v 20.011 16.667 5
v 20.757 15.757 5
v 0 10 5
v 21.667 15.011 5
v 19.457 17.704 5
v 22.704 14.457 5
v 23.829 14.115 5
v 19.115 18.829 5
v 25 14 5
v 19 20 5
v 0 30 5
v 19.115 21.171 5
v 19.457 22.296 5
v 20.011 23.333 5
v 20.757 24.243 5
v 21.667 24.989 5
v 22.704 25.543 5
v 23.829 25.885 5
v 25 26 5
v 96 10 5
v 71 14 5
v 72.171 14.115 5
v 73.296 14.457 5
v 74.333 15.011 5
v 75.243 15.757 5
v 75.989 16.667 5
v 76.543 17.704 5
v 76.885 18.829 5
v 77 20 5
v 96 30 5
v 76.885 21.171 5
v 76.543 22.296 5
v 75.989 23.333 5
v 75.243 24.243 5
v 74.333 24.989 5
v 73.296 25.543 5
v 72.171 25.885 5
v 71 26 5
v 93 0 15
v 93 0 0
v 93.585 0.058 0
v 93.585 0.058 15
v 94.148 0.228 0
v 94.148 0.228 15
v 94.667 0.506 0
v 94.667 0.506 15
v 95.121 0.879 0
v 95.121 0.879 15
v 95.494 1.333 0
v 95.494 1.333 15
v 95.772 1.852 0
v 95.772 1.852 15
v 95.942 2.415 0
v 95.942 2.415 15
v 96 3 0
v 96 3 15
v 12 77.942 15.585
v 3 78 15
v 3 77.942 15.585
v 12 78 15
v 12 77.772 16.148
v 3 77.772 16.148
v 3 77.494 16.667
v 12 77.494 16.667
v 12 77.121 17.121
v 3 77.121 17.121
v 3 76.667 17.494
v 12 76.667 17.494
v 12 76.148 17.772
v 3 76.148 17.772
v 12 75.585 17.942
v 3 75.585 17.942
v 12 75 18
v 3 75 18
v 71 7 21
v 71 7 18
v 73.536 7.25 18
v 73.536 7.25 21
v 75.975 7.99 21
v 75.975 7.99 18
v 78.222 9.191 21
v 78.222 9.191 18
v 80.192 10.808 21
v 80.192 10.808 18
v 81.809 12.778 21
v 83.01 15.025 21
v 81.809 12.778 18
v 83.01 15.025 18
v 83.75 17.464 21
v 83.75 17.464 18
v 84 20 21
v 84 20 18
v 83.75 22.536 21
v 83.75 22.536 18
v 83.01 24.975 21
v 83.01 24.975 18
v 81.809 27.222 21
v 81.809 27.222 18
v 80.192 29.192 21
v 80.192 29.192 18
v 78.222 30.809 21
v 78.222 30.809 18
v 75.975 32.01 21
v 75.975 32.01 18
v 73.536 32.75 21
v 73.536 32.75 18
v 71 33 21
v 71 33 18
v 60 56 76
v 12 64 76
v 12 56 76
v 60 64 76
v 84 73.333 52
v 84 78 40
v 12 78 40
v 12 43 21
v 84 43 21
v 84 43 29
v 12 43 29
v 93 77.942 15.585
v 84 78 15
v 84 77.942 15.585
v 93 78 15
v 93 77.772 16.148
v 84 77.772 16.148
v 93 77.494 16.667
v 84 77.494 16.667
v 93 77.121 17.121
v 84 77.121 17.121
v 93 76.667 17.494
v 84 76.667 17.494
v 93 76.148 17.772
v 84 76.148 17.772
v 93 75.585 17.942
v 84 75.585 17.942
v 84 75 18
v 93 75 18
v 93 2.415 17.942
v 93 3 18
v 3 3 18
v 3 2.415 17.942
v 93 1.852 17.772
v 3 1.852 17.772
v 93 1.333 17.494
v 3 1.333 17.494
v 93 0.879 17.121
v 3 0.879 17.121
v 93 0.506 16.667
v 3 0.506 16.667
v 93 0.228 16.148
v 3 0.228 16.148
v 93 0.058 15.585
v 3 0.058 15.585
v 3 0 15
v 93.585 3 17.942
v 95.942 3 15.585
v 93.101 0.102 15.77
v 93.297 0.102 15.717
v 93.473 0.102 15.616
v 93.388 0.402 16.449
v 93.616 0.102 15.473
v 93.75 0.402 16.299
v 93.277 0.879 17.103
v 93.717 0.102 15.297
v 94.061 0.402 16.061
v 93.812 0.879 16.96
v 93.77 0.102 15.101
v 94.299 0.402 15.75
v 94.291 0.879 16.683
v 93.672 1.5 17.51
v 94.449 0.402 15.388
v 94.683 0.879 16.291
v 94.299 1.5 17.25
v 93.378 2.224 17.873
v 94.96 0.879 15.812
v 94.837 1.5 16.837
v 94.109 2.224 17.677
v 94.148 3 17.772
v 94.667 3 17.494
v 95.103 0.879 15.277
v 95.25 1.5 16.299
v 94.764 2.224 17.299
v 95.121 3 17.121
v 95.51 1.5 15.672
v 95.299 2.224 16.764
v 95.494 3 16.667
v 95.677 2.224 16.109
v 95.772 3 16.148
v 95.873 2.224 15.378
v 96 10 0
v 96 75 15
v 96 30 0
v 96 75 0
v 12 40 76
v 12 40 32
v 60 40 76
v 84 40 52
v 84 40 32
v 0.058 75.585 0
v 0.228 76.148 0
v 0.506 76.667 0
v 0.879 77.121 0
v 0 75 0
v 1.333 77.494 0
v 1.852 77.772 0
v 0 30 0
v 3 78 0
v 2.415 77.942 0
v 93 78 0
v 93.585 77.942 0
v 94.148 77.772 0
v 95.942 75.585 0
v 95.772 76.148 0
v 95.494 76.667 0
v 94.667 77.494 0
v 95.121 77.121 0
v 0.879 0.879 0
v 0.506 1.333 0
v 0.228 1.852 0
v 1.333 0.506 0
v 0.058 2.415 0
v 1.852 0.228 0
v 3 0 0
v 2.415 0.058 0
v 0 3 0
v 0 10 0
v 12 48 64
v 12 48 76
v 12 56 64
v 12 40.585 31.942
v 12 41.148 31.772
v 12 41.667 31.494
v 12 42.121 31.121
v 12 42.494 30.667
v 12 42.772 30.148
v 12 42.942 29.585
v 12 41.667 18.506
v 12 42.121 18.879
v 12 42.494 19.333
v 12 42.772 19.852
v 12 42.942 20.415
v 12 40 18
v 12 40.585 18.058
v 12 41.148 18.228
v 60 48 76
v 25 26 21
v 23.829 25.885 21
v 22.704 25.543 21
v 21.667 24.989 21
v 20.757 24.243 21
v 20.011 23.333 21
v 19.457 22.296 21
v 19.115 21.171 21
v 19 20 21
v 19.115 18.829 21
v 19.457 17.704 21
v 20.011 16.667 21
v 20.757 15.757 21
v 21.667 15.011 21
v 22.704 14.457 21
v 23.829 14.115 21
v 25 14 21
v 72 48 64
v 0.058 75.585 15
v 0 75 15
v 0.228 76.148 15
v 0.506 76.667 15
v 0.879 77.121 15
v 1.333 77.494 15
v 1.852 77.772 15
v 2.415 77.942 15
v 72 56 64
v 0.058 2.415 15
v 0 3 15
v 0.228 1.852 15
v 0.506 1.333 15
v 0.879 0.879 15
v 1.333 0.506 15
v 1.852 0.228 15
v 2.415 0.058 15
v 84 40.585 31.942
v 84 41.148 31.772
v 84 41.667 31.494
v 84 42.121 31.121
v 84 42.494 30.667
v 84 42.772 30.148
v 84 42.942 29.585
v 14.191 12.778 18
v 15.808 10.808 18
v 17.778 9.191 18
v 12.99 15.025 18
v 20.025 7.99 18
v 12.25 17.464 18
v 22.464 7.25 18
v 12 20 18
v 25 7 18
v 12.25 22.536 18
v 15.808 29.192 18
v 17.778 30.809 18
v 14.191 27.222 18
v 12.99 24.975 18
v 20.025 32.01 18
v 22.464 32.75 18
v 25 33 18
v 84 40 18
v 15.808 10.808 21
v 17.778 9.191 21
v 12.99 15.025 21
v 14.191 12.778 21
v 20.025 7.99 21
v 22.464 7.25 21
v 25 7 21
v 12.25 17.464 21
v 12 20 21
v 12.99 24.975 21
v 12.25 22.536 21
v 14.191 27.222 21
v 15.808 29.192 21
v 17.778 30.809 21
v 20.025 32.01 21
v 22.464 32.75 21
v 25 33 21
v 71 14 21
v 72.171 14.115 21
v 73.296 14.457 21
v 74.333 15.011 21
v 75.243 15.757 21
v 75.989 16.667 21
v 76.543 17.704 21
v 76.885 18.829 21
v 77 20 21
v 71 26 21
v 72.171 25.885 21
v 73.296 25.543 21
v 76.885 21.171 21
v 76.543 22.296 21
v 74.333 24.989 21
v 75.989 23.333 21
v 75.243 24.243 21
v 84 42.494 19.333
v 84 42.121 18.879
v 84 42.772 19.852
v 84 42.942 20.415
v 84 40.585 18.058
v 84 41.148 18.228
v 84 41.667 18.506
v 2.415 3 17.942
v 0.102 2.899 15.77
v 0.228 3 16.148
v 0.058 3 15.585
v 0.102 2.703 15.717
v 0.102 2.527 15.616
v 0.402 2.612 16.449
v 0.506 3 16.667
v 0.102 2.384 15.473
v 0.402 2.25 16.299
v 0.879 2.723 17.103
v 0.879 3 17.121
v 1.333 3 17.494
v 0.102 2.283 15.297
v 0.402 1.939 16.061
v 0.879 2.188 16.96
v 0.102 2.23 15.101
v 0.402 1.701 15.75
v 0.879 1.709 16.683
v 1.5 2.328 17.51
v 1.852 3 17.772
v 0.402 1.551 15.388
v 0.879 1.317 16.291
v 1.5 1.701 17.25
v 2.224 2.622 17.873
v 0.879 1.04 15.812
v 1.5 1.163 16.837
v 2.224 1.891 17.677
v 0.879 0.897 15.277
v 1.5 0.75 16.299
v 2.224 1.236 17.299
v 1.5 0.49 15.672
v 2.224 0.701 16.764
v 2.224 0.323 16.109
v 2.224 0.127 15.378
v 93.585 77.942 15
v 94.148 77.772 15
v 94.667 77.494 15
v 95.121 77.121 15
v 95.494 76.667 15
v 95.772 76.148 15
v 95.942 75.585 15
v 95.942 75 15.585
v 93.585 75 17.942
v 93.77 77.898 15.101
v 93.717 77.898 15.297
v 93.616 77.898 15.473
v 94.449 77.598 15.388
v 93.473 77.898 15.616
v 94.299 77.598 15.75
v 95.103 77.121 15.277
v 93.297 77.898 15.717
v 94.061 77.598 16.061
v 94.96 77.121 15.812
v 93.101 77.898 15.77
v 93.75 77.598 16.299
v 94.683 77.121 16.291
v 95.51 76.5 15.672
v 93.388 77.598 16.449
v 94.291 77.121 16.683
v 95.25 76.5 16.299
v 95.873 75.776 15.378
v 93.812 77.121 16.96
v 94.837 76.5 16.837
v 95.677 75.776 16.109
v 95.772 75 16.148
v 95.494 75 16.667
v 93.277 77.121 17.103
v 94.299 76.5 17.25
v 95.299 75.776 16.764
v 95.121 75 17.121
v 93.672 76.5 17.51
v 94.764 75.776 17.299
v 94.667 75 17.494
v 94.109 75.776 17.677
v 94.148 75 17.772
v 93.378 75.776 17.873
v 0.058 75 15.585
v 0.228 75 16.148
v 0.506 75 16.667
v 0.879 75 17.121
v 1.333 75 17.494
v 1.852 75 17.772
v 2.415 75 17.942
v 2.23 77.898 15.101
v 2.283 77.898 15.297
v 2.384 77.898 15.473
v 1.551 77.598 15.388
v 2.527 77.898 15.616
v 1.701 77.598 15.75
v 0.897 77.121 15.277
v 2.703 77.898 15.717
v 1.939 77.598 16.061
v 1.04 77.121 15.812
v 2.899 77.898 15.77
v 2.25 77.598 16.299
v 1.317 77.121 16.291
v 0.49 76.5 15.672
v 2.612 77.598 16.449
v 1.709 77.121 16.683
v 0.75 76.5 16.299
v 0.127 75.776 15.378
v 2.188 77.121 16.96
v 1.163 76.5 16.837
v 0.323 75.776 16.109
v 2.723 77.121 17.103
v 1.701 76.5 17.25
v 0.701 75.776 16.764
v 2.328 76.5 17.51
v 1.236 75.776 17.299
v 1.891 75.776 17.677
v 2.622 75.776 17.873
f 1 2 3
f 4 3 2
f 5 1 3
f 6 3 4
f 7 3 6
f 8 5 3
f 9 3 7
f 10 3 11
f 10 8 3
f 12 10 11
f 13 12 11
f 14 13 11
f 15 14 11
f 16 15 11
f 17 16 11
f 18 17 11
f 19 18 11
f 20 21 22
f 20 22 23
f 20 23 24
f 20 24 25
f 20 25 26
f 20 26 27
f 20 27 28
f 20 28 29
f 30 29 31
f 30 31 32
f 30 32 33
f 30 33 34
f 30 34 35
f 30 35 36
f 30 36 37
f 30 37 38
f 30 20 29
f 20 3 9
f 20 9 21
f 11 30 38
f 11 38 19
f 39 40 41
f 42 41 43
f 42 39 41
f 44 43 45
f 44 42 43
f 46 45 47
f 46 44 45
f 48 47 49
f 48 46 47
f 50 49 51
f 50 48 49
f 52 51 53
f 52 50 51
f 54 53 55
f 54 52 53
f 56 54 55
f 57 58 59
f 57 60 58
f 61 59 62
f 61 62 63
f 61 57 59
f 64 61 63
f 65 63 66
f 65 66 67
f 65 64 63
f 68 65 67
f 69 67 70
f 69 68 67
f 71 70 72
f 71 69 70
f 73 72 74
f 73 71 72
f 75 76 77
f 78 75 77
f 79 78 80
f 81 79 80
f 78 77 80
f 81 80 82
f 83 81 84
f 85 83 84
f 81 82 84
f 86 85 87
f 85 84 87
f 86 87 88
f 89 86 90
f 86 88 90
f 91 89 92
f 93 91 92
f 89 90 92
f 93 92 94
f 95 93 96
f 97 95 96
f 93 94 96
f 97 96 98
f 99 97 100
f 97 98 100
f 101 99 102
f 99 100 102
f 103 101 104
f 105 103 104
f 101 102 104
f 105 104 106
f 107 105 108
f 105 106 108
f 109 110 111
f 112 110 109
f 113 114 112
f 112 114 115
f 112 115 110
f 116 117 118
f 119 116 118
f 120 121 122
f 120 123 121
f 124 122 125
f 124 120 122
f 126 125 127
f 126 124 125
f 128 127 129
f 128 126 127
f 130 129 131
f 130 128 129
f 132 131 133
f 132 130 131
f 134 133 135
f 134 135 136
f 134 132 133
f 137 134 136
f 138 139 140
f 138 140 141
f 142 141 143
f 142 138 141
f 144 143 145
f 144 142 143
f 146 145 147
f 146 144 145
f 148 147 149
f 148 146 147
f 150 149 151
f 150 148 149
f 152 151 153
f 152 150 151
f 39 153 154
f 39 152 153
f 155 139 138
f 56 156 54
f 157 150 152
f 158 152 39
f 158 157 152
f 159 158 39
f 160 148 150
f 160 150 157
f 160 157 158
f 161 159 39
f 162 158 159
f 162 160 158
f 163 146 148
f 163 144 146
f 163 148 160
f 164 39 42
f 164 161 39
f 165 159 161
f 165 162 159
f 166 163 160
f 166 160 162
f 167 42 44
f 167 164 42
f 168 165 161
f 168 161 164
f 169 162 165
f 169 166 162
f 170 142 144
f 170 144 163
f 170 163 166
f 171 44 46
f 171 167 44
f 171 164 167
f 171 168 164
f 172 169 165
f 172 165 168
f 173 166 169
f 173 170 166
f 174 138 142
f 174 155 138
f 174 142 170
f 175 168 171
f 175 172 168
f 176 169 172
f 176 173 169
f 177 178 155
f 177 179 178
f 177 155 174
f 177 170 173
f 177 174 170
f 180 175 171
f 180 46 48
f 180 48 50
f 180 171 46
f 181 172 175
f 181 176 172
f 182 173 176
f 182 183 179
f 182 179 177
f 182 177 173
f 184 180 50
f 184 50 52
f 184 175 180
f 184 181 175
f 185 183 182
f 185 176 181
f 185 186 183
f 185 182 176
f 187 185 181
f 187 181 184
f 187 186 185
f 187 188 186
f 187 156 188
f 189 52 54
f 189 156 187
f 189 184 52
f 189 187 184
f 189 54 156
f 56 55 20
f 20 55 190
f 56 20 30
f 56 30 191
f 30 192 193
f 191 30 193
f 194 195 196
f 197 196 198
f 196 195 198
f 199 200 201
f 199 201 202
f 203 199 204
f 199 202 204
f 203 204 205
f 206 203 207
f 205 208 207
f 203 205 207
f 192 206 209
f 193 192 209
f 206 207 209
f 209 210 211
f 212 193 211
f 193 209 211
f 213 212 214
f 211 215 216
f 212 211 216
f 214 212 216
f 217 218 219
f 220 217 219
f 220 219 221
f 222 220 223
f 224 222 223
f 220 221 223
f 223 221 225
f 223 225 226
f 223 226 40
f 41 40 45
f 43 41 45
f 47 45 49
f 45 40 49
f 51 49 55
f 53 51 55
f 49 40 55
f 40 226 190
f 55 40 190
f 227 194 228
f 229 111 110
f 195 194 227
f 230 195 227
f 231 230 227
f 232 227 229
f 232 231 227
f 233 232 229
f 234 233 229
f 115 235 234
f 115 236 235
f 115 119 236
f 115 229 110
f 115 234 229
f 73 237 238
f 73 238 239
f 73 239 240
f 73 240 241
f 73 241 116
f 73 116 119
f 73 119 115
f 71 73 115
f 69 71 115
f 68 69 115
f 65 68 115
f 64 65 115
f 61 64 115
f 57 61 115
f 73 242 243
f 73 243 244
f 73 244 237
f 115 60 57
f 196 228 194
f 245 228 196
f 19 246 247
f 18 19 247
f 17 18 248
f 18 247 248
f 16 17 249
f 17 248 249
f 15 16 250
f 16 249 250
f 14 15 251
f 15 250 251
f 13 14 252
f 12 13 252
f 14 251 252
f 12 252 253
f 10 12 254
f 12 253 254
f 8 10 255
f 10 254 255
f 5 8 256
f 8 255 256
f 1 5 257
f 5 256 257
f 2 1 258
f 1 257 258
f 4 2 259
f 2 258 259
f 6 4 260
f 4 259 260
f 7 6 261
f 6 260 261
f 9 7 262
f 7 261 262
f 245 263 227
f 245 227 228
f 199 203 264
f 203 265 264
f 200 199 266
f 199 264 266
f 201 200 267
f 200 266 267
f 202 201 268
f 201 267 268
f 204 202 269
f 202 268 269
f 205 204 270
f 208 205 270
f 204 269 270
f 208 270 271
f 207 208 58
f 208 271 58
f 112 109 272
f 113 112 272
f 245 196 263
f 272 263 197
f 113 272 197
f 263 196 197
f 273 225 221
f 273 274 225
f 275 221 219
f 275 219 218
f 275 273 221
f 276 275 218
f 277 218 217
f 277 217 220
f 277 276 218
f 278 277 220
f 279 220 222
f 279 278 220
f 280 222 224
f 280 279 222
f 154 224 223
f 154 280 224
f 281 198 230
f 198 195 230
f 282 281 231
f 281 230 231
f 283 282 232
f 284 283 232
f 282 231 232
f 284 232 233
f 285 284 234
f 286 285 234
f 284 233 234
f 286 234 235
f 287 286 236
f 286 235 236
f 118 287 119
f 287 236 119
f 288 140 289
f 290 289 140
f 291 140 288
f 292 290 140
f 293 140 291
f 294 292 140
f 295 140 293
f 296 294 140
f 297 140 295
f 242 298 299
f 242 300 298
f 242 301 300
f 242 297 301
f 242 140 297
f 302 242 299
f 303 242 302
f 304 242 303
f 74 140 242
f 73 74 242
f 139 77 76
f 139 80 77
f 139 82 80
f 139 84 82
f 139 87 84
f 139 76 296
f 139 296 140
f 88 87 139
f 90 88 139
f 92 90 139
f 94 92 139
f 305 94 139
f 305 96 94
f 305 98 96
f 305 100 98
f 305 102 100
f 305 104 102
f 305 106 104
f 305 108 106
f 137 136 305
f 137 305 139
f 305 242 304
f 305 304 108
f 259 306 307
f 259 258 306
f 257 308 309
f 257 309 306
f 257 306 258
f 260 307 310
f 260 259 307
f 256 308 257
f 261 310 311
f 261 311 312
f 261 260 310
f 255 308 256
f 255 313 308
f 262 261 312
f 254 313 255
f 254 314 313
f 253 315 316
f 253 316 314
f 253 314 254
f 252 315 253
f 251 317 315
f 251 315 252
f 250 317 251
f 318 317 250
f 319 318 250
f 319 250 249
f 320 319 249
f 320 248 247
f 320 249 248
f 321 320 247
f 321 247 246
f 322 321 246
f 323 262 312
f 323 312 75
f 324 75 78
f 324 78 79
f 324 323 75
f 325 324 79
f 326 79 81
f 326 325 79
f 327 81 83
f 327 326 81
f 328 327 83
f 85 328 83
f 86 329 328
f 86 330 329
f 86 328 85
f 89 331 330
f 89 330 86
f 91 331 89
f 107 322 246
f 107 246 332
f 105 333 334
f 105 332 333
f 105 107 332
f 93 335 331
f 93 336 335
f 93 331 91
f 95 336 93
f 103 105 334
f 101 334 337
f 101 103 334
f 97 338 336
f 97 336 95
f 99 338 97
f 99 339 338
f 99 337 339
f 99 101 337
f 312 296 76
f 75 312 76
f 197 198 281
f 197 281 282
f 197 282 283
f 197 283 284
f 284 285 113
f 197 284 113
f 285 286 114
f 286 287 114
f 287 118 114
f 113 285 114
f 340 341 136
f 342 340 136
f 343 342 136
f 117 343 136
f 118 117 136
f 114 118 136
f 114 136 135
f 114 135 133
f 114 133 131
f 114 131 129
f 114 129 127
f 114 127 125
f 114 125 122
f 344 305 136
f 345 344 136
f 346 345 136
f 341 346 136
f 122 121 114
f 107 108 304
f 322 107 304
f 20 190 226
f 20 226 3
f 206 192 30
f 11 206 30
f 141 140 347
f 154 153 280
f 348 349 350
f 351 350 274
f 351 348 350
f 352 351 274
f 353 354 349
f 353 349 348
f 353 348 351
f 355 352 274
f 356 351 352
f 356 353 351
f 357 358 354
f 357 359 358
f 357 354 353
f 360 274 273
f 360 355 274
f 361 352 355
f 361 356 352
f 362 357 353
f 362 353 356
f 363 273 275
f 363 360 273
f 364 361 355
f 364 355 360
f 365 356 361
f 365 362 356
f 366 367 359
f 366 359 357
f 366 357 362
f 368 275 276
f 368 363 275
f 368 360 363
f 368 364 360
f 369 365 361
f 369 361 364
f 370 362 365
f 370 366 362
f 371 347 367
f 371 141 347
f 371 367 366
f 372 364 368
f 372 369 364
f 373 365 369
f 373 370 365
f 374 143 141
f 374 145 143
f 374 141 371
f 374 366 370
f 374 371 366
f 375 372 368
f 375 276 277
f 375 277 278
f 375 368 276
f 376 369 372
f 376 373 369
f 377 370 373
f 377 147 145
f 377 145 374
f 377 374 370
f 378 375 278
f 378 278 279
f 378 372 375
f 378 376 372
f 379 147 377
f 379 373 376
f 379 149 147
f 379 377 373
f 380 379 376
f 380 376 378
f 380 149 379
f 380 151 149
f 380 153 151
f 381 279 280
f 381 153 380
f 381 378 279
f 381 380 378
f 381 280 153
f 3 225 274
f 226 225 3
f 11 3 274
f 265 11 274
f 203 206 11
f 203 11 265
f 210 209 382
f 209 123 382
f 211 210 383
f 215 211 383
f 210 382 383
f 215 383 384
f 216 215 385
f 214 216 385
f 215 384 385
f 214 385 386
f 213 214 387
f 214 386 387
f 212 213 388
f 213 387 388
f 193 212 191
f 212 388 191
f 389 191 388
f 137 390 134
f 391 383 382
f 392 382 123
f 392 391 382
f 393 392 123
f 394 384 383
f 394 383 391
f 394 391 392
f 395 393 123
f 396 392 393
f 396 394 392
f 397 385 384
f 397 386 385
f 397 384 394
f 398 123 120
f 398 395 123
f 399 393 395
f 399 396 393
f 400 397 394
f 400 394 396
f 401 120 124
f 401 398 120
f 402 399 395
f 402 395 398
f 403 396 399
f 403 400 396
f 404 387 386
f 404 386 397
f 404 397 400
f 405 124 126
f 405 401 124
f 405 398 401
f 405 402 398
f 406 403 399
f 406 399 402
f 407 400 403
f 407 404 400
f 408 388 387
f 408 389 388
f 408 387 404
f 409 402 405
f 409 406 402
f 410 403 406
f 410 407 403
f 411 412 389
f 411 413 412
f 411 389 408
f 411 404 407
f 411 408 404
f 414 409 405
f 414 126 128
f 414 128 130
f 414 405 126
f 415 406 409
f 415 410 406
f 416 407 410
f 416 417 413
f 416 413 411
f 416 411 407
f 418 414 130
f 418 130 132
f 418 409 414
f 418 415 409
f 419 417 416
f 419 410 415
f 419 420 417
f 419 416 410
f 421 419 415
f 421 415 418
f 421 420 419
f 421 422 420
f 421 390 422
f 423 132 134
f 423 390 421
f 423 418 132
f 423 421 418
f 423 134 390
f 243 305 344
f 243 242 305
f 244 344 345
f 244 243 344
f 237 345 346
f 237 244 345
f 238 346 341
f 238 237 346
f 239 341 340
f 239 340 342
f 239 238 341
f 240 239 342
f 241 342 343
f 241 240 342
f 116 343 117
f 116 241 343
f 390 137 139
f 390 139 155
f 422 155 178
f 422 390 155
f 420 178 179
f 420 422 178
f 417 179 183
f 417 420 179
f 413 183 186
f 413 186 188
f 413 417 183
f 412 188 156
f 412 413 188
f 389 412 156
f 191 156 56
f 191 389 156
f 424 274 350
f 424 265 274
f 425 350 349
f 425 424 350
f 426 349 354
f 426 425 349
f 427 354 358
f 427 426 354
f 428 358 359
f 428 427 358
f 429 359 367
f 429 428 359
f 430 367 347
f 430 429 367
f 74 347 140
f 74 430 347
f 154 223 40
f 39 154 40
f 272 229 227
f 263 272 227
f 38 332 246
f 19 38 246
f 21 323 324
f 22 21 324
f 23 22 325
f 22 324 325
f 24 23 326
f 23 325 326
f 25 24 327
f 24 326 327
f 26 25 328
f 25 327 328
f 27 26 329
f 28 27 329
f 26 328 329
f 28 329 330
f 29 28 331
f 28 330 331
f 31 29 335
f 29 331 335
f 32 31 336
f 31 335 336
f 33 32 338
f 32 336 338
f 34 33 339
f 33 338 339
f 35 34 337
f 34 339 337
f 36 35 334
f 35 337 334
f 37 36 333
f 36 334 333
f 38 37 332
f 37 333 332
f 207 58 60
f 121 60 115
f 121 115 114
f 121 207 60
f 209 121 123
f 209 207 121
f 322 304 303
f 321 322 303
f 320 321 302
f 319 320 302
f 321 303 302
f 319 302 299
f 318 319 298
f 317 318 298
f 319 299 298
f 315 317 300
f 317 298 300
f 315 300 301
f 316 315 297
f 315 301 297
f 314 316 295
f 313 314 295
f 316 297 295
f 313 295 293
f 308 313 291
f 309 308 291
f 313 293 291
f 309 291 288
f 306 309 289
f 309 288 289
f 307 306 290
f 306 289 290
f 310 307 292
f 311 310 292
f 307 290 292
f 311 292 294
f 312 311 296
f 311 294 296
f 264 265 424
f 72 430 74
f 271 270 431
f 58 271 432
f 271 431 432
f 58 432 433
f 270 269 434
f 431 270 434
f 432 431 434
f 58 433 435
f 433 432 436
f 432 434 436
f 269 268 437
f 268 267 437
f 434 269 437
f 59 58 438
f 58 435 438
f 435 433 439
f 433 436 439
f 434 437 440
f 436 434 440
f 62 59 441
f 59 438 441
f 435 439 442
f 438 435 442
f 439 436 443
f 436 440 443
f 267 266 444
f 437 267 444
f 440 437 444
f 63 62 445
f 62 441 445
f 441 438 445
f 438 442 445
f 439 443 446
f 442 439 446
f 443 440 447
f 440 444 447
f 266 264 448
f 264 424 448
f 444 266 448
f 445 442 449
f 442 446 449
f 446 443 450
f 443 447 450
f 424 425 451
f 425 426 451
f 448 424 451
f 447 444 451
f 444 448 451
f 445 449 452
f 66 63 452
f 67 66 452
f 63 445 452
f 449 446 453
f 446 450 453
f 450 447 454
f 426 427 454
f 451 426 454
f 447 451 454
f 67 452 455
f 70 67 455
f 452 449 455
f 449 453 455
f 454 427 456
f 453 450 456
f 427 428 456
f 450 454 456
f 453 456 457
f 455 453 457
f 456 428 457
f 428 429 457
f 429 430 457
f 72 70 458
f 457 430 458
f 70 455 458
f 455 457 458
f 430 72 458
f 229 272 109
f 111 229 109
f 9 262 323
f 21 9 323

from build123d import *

# Parameters (mm, degrees)
F0_W      = 96
F0_H      = 78
F1_DEPTH  = 18
F2_W      = 72
F2_H      = 38
F4_DEPTH  = 58
F6_DEPTH  = 38
F8_DEPTH  = 72.001
F9_W      = 8
F9_H      = 12
F10_DEPTH = 60.001
F12_DEPTH = 3
F14_DEPTH = 21
F15_W     = 20
F15_H     = 5
F16_DEPTH = 96.001
F17_W     = 3
F17_H     = 14
F18_DEPTH = 72
F19_R     = 2.99999


# Not quite as in the source:
# - a fillet or chamfer is up to 0.001 mm smaller than in the source, because OpenCascade refuses the exact size


with BuildPart() as f1:
    # F0 (on Top) → F1 (new body)
    with BuildSketch(Plane.XY):
        with Locations((48, 39)):
            Rectangle(F0_W, F0_H)
    extrude(amount=F1_DEPTH)

    # F2 (on face) → F4 (join, through all)
    with BuildSketch(Plane.XY.offset(18)):
        with Locations((48, 59)):
            Rectangle(F2_W, F2_H)
    extrude(amount=F4_DEPTH)

    # F5 (on face) → F6 (cut, through all)
    with BuildSketch(Plane.XZ.offset(-40)):
        Polygon((84, 76), (60, 76), (84, 52), align=None)
    extrude(amount=-F6_DEPTH, mode=Mode.SUBTRACT)

    # F7 (on face) → F8 (cut, through all)
    with BuildSketch(Plane(origin=(12, 0, 0), x_dir=(0, -1, 0), z_dir=(-1, 0, 0))):
        Polygon((-78, 76), (-78, 40), (-64, 76), align=None)
    extrude(amount=-F8_DEPTH, mode=Mode.SUBTRACT)

    # F9 (on face) → F10 (cut, through all)
    with BuildSketch(Plane(origin=(12, 0, 0), x_dir=(0, -1, 0), z_dir=(-1, 0, 0))):
        with Locations((-52, 70)):
            Rectangle(F9_W, F9_H)
    extrude(amount=-F10_DEPTH, mode=Mode.SUBTRACT)

    # F11 (on face) → F12 (join)
    with BuildSketch(Plane.XY.offset(18)):
        with BuildLine():
            Line((71, 33), (25, 33))
            ThreePointArc((25, 33), (12, 20), (25, 7))
            Line((25, 7), (71, 7))
            ThreePointArc((71, 7), (84, 20), (71, 33))
        make_face()
    extrude(amount=F12_DEPTH)

    # F13 (on face) → F14 (cut, through all)
    with BuildSketch(Plane.XY.offset(21)):
        with BuildLine():
            Line((71, 26), (25, 26))
            ThreePointArc((25, 26), (19, 20), (25, 14))
            Line((25, 14), (71, 14))
            ThreePointArc((71, 14), (77, 20), (71, 26))
        make_face()
    extrude(amount=-F14_DEPTH, mode=Mode.SUBTRACT)

    # F15 (on face) → F16 (cut, through all)
    with BuildSketch(Plane.YZ.offset(96)):
        with Locations((20, 2.5)):
            Rectangle(F15_W, F15_H)
    extrude(amount=-F16_DEPTH, mode=Mode.SUBTRACT)

    # F17 (on face) → F18 (cut, through all)
    with BuildSketch(Plane.YZ.offset(84)):
        with Locations((41.5, 25)):
            Rectangle(F17_W, F17_H)
    extrude(amount=-F18_DEPTH, mode=Mode.SUBTRACT)

    # F19 (radius 3 in the source; OpenCascade refuses exactly that, so slightly less here)
    f19_edges = [f1.edges().sort_by_distance(p)[0] for p in [
        (48, 43, 18),
        (48, 43, 32),
        (96, 39, 18),
        (48, 0, 18),
        (96, 0, 9),
        (96, 78, 9),
        (90, 78, 18),
        (0, 39, 18),
        (0, 0, 9),
        (0, 78, 9),
        (6, 78, 18),
    ]]
    fillet(f19_edges, radius=F19_R)


solid = f1.part
